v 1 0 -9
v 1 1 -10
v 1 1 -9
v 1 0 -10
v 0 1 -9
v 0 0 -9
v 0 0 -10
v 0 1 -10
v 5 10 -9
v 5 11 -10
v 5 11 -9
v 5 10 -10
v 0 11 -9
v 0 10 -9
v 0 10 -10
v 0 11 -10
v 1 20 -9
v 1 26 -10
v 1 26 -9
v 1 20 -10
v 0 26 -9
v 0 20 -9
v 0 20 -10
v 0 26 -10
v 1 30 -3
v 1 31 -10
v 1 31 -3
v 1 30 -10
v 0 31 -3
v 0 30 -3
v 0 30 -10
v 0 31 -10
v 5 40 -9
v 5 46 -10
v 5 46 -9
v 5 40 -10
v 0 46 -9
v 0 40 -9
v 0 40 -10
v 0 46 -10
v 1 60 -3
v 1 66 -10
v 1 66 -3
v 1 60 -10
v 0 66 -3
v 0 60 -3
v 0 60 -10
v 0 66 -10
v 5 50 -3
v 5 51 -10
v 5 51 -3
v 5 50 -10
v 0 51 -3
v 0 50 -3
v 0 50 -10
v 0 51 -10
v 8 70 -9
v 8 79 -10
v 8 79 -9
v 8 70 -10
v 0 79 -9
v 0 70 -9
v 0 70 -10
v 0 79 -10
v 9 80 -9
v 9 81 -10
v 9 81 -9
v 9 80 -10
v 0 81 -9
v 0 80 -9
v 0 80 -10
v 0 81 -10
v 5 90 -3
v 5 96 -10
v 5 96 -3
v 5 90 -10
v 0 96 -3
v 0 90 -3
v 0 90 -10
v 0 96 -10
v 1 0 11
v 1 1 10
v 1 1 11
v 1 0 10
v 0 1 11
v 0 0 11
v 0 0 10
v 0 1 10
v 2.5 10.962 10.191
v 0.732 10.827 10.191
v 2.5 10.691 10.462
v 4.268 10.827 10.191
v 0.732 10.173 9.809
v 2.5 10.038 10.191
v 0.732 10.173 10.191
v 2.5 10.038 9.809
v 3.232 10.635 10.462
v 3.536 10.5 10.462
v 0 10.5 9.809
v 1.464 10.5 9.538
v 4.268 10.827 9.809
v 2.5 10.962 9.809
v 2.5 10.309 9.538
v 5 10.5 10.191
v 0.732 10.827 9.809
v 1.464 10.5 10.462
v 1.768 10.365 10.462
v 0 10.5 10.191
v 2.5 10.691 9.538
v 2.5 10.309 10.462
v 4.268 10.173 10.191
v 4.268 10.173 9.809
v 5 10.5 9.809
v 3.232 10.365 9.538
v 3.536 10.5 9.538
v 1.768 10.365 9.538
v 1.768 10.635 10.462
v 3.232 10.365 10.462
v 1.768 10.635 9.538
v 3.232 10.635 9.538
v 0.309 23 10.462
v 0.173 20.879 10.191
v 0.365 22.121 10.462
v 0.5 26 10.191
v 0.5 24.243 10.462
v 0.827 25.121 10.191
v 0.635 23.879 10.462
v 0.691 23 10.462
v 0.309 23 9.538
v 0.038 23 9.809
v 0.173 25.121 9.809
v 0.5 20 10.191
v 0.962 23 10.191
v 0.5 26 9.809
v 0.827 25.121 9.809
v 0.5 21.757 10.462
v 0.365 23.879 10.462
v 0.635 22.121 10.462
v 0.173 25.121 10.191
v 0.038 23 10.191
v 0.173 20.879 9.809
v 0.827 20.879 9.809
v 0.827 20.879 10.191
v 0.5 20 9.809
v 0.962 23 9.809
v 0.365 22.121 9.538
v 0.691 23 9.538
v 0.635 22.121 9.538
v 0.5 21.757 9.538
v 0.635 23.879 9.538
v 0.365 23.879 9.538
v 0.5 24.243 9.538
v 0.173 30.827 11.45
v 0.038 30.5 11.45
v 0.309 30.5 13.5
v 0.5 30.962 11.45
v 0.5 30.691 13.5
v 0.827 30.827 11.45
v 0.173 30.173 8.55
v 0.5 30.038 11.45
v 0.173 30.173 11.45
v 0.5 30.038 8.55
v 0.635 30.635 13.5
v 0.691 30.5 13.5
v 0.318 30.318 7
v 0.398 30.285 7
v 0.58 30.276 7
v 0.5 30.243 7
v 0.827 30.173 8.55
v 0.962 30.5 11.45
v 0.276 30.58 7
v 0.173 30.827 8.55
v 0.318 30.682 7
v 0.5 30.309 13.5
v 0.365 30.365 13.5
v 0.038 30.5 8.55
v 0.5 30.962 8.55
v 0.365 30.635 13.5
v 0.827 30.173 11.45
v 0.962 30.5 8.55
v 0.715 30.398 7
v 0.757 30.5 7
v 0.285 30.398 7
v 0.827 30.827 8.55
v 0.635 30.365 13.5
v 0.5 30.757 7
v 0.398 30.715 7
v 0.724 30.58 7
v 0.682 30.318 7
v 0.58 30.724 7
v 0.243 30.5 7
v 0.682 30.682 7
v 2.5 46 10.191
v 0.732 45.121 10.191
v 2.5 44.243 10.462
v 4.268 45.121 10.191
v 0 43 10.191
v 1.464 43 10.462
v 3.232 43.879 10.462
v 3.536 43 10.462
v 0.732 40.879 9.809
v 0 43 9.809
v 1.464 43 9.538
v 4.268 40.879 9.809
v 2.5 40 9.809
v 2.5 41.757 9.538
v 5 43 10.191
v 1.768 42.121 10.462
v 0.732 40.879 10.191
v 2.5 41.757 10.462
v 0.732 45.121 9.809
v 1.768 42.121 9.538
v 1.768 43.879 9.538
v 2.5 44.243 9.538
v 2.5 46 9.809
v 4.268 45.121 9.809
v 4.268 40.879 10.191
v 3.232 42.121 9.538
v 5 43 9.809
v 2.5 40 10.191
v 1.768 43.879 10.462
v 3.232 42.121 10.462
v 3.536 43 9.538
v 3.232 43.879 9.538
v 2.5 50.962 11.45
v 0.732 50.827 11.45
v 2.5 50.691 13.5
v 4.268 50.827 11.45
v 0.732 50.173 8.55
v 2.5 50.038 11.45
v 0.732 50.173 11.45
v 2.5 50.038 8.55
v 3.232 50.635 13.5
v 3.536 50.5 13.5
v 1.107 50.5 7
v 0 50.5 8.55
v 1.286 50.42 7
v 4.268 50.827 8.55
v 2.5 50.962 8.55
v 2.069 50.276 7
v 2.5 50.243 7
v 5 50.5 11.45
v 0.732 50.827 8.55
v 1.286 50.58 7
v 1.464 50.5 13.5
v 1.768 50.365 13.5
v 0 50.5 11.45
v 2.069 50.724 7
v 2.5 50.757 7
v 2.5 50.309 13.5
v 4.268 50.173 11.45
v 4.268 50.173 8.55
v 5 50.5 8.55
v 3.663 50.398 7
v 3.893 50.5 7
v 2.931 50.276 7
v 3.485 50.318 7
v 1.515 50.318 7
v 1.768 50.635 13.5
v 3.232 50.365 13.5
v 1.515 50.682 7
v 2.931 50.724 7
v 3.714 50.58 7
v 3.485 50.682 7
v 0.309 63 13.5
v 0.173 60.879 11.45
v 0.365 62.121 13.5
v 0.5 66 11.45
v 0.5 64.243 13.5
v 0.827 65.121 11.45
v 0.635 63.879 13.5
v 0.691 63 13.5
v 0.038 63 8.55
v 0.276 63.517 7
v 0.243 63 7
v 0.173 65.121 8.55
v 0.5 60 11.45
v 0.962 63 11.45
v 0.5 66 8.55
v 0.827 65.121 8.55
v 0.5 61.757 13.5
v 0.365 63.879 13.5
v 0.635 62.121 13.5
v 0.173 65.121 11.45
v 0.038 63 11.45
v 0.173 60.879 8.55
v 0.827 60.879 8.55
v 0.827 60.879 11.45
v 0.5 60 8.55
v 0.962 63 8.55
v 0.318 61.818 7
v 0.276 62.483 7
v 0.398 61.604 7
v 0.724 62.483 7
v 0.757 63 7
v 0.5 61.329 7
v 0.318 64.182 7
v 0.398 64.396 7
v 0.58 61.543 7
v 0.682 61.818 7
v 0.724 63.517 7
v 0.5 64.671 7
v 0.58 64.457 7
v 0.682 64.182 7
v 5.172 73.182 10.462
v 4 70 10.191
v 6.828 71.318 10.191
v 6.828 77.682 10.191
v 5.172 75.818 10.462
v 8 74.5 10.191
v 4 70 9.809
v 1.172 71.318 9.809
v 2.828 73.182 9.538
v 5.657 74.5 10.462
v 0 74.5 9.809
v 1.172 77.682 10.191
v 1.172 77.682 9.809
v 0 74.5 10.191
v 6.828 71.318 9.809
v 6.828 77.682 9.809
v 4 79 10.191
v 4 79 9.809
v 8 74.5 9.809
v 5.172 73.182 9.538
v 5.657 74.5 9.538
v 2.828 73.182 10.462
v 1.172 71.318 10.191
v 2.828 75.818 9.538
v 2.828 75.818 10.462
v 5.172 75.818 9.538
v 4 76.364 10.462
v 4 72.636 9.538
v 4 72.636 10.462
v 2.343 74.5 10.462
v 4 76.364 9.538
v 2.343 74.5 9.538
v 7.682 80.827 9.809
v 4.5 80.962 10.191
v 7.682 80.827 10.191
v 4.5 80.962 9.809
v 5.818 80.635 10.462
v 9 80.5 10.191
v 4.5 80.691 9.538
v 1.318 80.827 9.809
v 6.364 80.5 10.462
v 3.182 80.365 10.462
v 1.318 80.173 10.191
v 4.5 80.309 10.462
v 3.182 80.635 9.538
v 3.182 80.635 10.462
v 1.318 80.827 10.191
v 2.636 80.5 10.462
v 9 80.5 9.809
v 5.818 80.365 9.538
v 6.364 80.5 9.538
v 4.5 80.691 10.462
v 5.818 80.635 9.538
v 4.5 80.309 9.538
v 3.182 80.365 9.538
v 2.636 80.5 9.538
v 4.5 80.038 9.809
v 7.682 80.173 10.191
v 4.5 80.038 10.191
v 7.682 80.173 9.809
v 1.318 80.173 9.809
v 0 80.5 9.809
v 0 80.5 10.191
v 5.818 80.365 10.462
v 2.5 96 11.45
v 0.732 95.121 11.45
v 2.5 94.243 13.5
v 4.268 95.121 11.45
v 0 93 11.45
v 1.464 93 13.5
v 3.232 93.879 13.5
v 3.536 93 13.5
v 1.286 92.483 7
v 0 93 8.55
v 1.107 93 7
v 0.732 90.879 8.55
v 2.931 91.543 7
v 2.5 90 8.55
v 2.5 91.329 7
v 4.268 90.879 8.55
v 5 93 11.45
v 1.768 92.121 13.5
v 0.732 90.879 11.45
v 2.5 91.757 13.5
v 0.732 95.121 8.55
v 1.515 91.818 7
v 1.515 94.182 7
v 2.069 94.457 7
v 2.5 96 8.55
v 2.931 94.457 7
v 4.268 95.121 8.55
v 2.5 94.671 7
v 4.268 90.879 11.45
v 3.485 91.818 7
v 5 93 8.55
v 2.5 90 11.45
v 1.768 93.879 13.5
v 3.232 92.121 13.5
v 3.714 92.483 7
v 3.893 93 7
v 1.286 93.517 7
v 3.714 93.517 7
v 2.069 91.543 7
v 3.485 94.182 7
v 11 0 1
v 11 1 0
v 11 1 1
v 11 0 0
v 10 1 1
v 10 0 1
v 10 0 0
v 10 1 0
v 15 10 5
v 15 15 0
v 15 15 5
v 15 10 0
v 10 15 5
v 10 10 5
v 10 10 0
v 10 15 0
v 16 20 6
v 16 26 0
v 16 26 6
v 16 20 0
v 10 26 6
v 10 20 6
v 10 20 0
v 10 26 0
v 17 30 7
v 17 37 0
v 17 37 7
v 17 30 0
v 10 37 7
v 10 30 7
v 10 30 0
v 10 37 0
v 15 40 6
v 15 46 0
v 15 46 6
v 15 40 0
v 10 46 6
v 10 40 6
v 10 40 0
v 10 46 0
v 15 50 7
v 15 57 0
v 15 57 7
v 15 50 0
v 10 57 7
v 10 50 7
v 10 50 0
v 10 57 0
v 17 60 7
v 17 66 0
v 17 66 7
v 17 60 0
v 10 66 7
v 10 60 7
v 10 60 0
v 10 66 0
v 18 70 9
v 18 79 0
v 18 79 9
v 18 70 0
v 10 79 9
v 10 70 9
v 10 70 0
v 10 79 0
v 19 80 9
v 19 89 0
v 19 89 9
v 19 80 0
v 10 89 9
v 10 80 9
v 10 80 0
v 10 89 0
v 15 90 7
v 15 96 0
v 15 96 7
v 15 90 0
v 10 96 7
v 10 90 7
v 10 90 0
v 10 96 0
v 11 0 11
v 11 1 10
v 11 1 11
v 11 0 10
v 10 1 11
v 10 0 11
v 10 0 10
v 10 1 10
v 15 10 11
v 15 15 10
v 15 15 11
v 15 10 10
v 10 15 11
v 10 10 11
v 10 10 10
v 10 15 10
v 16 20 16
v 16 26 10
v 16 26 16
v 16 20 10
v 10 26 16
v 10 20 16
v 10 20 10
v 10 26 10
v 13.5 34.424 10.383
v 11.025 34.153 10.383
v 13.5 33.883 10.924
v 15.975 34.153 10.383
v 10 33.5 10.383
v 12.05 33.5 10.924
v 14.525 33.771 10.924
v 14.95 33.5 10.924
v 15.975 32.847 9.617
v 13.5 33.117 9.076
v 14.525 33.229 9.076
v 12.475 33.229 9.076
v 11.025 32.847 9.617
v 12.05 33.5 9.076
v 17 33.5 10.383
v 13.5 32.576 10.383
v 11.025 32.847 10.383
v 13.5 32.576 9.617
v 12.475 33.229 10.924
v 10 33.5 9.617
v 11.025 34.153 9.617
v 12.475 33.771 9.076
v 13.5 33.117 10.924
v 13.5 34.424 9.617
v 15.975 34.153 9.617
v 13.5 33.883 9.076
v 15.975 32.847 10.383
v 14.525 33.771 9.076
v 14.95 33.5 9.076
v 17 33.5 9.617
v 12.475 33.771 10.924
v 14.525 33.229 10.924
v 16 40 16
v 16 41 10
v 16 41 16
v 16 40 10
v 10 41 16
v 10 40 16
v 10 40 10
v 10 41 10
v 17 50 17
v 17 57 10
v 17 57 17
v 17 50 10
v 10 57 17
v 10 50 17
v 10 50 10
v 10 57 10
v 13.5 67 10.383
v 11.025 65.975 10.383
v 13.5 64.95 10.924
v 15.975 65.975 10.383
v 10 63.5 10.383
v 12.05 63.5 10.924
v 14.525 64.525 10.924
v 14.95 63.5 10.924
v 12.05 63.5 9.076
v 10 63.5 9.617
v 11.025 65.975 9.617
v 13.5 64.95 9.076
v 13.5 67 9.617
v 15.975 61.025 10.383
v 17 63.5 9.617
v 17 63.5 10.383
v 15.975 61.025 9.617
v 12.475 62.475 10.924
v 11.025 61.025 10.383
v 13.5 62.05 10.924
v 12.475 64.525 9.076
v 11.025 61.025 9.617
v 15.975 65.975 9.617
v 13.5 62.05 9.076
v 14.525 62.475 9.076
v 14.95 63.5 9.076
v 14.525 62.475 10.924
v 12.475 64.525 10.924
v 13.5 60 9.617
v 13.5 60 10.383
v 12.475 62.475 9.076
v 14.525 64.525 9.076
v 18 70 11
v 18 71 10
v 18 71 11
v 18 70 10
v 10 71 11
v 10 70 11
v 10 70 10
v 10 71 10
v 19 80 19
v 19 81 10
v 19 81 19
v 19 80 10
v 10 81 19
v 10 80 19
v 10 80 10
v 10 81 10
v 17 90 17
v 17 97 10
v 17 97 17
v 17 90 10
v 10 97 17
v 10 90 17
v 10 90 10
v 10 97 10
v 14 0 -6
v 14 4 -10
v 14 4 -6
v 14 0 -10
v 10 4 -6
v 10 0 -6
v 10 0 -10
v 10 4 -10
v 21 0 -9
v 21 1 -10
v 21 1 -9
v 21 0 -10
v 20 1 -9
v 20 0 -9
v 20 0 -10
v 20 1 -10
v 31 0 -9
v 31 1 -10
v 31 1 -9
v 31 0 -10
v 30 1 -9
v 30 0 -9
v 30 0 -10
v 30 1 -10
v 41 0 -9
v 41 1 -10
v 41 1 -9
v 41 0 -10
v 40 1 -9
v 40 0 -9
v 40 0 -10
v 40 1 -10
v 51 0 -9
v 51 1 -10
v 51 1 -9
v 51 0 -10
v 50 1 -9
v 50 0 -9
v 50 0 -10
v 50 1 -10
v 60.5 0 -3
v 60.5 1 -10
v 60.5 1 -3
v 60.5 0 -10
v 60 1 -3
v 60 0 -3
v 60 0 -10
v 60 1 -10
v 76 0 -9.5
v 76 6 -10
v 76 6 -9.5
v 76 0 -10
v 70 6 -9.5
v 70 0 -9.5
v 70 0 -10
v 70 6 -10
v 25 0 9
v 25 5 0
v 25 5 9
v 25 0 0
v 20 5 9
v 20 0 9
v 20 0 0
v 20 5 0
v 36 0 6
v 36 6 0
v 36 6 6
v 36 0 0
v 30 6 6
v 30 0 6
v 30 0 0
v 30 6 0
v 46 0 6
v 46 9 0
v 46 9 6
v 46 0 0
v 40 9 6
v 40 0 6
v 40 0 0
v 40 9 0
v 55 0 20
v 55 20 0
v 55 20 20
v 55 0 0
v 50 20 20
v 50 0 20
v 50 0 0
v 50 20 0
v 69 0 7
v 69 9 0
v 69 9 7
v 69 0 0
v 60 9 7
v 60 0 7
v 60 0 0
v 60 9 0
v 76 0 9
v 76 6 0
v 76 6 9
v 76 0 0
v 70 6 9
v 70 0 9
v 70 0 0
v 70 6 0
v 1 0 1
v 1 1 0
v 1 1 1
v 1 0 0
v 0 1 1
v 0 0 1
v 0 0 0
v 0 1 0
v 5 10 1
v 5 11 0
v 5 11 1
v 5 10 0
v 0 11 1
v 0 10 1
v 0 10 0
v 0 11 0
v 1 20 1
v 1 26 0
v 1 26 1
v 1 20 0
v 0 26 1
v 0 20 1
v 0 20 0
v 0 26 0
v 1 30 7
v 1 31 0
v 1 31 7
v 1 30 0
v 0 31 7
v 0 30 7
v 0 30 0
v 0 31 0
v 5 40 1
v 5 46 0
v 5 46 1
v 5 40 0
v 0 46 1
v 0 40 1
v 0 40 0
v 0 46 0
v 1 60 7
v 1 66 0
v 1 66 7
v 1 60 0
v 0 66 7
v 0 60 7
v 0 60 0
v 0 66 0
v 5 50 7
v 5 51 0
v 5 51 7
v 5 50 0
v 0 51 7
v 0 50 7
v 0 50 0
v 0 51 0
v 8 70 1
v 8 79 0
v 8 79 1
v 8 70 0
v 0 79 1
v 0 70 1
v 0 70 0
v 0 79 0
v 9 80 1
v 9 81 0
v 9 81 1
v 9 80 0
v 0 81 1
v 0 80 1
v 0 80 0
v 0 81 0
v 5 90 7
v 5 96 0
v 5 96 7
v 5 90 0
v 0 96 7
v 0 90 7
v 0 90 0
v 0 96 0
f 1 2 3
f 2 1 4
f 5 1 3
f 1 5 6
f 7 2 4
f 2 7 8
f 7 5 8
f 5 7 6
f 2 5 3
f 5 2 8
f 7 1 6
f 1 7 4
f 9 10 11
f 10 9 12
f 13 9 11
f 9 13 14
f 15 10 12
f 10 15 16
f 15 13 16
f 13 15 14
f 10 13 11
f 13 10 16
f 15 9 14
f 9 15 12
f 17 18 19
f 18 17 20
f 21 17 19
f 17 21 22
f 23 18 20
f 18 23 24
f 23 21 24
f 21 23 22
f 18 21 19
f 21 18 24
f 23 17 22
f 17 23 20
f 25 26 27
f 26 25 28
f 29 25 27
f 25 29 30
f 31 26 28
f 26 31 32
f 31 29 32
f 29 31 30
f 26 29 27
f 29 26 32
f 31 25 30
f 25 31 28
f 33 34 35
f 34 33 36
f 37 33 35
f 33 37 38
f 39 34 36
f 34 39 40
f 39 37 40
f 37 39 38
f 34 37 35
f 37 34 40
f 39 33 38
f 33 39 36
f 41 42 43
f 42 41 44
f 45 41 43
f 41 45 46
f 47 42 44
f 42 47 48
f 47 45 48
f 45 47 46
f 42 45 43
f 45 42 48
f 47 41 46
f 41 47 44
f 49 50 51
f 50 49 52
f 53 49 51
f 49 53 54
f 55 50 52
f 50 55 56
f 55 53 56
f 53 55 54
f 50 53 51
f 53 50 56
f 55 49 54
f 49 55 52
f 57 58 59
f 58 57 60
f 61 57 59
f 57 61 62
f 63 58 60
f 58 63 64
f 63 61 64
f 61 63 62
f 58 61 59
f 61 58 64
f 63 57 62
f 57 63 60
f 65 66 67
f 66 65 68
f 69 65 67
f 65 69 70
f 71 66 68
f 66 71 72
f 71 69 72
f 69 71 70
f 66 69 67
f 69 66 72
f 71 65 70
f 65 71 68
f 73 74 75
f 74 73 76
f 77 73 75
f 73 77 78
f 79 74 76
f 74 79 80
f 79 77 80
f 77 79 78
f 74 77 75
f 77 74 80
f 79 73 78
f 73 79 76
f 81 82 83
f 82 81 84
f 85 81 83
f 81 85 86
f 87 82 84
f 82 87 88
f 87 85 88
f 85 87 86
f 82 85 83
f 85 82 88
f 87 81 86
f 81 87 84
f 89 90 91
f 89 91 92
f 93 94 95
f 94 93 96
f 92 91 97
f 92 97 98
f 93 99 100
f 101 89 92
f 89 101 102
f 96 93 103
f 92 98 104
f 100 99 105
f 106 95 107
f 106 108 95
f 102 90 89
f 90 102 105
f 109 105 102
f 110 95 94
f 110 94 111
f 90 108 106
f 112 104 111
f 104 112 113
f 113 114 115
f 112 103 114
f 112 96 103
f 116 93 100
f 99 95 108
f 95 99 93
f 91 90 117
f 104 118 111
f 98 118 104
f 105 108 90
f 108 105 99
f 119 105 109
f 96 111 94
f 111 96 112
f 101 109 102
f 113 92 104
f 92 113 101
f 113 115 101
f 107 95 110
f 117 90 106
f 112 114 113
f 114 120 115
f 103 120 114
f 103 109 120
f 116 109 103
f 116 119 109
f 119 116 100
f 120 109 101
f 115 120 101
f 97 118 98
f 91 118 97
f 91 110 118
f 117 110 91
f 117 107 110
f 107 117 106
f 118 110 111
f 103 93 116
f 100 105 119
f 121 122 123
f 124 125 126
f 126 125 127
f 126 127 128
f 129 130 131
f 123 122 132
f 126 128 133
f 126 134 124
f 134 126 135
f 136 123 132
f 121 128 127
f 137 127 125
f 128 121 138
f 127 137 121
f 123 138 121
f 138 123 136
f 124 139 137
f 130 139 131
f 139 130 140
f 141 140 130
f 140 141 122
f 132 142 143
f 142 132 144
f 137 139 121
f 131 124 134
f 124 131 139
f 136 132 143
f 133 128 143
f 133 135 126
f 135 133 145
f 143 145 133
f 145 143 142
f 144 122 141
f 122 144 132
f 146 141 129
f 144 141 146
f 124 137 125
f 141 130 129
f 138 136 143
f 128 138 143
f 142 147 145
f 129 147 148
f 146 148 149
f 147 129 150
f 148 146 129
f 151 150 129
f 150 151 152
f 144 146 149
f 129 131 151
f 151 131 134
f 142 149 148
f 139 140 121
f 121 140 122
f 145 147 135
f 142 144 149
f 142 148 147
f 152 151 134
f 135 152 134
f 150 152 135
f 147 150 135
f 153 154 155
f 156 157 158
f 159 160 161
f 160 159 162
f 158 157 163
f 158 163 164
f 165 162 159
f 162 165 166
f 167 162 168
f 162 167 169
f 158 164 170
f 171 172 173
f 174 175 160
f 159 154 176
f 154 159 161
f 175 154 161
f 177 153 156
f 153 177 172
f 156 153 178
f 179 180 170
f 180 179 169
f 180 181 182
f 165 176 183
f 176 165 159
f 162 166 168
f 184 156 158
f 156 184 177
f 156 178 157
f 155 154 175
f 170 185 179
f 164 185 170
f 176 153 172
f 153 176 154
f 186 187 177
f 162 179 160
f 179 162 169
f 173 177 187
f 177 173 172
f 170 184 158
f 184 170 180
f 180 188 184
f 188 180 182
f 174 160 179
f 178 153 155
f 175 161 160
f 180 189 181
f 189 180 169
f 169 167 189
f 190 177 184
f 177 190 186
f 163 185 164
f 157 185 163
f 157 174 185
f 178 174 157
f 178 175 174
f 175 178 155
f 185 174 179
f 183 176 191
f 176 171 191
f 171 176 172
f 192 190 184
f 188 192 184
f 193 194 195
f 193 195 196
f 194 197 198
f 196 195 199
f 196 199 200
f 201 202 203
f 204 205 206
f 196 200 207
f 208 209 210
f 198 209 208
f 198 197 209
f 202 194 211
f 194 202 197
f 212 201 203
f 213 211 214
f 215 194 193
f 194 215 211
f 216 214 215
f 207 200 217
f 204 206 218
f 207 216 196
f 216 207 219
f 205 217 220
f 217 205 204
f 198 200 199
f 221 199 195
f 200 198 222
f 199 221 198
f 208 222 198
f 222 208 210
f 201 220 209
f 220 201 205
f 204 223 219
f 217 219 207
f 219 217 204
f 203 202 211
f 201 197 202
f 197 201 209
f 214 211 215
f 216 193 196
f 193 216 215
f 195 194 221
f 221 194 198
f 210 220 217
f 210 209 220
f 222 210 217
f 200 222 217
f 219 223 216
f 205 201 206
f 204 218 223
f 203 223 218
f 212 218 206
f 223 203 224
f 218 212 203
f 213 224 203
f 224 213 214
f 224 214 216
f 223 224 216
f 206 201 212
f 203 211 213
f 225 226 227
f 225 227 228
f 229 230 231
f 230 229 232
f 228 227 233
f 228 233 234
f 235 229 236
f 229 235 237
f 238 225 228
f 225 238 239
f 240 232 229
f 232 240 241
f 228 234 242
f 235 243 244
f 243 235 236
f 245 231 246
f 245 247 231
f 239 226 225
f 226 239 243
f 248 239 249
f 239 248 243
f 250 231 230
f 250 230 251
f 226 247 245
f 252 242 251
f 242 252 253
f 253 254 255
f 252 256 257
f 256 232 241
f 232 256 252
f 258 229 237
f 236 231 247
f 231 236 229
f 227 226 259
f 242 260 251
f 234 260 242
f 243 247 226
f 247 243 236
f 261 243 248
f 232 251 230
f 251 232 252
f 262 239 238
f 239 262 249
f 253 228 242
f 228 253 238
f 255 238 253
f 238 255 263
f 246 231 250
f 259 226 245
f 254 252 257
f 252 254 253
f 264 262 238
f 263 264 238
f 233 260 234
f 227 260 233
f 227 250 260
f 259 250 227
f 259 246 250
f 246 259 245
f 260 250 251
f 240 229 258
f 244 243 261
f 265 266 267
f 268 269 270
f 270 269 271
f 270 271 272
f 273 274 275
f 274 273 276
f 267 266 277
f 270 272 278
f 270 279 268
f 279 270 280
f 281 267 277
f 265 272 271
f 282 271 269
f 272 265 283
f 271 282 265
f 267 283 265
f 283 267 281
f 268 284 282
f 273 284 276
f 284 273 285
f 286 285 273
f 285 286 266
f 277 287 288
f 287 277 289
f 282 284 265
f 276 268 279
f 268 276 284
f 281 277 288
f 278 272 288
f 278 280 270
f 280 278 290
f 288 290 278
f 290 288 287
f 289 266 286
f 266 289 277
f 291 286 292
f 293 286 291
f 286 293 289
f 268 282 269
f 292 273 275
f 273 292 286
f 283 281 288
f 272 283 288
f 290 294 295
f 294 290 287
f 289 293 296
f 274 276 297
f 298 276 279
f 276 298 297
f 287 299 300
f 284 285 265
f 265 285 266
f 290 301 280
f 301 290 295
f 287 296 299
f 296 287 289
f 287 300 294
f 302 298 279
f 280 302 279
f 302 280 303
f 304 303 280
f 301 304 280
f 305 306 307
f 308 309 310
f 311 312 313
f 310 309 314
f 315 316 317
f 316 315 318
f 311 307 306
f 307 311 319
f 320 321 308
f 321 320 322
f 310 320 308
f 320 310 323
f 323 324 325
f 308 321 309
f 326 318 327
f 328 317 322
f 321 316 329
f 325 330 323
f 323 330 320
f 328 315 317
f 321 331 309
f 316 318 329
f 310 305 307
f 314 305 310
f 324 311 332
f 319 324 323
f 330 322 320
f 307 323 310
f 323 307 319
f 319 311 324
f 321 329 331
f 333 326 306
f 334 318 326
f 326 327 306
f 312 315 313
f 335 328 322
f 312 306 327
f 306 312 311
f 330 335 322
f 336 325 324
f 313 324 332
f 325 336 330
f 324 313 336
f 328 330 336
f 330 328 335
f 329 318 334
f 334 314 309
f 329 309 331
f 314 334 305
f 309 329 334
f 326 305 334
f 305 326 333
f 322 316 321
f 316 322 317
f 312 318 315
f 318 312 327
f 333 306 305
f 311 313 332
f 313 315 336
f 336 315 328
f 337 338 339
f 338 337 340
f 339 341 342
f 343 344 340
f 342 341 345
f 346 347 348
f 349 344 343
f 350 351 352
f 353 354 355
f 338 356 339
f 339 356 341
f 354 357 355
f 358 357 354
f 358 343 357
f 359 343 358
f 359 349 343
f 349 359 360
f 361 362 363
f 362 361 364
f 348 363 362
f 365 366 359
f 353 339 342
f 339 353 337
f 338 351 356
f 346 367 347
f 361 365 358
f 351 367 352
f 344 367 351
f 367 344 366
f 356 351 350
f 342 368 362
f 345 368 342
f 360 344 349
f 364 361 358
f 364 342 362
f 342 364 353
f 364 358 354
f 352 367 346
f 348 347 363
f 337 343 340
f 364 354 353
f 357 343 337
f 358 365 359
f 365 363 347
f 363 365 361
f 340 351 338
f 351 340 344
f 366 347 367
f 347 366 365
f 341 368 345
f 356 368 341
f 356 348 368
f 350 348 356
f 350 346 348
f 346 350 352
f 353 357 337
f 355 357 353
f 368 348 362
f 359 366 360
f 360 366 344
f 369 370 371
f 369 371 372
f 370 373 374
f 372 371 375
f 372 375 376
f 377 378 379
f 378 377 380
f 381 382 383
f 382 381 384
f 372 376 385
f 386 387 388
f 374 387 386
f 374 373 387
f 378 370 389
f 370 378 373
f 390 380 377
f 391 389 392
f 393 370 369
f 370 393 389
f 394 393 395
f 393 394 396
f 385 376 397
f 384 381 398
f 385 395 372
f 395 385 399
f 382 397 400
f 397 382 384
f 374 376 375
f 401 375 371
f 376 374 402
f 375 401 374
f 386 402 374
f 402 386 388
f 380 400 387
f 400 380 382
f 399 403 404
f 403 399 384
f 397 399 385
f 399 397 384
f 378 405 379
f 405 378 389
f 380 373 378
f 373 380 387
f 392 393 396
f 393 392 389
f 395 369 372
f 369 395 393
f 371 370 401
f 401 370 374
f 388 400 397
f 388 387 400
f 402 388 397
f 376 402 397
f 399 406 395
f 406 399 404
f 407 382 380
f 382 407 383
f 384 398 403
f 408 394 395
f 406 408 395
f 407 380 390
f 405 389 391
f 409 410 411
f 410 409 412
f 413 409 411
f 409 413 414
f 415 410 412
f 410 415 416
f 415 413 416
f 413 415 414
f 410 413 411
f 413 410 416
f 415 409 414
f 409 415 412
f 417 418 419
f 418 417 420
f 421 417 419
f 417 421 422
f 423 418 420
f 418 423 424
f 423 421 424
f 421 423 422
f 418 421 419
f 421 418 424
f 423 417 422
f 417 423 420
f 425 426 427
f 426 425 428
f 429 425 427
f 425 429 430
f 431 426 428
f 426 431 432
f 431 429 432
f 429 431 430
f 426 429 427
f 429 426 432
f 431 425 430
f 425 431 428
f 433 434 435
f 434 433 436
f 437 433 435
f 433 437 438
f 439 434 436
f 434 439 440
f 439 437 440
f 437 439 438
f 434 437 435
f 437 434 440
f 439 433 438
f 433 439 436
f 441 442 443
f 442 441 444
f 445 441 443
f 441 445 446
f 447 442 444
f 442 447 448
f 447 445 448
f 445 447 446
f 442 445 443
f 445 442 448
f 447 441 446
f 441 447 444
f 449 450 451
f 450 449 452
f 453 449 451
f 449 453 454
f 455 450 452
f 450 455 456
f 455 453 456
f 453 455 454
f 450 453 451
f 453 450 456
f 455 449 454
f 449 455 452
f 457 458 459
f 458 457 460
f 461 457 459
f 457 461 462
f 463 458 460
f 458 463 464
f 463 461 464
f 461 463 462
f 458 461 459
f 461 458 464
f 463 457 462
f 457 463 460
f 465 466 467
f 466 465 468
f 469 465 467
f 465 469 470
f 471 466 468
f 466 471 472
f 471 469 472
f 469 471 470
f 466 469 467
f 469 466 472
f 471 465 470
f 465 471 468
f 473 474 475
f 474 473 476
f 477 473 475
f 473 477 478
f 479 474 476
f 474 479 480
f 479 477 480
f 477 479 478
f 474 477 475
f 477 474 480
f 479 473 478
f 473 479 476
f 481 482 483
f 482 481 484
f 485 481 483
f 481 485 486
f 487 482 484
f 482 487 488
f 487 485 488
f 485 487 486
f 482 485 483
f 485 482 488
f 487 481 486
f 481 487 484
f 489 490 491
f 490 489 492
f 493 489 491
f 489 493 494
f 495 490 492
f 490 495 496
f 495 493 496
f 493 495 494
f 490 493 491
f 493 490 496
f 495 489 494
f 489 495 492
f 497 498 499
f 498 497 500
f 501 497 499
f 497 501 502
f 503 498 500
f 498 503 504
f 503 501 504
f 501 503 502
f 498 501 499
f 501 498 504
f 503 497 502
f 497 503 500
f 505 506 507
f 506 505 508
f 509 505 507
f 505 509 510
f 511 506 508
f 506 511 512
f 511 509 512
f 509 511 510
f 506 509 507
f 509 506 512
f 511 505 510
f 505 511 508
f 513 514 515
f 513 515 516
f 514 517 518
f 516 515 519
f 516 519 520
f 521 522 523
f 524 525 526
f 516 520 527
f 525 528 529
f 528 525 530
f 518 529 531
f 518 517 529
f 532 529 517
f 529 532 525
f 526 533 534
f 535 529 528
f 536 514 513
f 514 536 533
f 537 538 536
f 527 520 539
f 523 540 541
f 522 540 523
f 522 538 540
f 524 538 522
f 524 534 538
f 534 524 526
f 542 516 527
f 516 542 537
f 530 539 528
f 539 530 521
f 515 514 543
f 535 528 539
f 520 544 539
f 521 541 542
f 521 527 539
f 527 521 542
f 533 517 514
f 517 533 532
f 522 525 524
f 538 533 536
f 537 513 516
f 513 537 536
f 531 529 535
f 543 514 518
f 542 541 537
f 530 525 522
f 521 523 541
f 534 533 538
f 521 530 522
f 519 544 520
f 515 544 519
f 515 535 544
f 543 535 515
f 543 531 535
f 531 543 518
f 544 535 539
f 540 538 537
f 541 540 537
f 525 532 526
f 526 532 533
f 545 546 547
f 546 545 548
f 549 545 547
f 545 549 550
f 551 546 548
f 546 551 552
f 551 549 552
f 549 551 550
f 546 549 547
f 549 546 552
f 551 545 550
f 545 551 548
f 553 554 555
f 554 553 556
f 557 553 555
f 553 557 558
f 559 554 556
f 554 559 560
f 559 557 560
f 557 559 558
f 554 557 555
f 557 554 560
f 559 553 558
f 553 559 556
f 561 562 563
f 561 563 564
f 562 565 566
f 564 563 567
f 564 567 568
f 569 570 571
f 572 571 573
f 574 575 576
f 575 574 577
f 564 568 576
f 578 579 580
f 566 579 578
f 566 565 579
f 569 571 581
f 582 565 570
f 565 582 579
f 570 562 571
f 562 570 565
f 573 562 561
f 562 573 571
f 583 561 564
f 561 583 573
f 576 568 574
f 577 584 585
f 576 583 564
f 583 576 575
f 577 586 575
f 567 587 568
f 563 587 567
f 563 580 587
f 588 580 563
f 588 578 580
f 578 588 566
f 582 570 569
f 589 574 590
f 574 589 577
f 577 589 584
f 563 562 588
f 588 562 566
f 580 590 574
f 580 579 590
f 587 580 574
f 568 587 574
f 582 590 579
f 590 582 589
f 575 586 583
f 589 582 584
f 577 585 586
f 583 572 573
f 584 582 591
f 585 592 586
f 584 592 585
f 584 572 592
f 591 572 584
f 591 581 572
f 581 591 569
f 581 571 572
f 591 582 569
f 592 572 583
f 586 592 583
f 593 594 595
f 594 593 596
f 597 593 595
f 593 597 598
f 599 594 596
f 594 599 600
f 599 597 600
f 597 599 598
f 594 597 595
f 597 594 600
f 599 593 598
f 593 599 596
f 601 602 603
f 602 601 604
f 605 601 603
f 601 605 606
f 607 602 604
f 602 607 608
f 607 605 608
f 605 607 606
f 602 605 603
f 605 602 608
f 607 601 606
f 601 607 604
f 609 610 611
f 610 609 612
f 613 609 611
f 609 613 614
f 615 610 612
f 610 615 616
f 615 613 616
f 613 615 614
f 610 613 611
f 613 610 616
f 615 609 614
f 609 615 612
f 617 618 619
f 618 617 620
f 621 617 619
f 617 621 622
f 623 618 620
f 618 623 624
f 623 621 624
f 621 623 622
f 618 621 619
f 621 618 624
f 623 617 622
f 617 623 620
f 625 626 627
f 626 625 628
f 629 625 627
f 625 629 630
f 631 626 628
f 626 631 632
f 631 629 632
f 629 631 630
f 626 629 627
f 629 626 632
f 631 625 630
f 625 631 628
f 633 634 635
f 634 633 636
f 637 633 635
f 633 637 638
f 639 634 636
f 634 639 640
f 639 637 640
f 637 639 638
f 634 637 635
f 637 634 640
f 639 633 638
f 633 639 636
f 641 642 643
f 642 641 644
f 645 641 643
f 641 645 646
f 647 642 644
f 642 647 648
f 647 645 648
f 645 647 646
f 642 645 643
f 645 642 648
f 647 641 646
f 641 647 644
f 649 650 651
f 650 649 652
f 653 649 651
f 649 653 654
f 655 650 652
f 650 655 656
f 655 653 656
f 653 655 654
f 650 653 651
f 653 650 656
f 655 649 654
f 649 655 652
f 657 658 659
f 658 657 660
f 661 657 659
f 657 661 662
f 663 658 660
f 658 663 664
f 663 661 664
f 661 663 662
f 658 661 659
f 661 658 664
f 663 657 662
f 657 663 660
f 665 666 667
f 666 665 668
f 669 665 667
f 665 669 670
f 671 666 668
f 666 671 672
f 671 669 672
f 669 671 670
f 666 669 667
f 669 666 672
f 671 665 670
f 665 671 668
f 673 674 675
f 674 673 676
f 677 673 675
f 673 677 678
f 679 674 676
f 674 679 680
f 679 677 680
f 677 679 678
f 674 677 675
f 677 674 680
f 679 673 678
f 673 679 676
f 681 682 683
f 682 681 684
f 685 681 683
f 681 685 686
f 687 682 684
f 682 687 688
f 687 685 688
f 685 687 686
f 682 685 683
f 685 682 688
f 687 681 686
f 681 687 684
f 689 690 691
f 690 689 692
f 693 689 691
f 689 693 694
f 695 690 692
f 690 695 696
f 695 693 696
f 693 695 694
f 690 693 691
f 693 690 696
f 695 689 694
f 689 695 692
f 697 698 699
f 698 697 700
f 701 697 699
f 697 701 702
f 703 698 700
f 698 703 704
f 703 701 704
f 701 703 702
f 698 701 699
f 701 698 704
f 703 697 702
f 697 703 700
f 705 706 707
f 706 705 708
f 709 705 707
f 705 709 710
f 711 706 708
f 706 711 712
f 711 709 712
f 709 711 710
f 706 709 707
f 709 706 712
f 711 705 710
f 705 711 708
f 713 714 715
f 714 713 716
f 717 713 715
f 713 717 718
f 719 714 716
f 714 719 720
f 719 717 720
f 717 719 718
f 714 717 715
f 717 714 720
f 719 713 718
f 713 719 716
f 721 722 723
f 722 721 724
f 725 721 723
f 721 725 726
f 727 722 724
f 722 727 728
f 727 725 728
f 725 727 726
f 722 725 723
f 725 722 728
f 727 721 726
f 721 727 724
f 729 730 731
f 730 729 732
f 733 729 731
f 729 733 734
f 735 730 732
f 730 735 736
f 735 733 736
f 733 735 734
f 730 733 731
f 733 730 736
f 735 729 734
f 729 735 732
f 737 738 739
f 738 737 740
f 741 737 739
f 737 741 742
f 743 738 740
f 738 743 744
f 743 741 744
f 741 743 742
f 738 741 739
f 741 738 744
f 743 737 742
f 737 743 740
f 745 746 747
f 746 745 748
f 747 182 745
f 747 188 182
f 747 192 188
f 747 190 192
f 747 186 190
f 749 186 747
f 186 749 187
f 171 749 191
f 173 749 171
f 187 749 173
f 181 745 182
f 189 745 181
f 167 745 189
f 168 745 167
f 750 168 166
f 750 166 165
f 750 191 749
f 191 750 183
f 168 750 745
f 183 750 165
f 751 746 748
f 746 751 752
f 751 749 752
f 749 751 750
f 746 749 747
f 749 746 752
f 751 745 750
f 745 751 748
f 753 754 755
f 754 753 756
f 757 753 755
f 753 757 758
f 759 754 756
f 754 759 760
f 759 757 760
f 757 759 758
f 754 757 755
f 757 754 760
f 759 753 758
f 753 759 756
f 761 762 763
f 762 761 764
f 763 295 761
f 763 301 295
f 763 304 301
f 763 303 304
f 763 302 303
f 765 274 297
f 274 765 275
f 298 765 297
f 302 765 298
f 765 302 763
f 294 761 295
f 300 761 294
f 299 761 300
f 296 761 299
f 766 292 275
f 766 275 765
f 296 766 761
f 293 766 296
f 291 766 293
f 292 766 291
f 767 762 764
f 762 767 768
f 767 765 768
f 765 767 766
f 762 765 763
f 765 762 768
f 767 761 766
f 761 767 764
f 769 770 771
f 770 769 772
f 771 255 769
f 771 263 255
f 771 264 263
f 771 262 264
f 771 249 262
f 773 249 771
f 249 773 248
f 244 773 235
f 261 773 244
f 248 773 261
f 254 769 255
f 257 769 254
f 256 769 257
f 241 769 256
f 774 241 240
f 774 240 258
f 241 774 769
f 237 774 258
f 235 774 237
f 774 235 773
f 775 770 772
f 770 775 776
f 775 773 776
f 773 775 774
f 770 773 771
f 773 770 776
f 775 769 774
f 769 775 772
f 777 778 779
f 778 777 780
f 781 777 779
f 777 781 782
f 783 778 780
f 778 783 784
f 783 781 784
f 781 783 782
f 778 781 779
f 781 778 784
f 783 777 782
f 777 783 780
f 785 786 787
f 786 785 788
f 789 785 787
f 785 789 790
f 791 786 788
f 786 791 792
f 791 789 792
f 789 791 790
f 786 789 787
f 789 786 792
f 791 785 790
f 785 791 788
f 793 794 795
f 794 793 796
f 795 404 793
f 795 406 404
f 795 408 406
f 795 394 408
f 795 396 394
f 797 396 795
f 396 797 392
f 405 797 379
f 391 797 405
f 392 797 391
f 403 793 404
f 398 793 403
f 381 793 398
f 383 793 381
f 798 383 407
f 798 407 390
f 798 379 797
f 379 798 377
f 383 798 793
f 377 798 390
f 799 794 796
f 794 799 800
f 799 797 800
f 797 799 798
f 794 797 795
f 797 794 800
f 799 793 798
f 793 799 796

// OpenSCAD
// bottom row (red) = reference
// middle row (gold) = should match reference
// top row (blue) = should be 'spherical' versions of gold row,
//     and should be inscribed in gold row in 'top' view
// back row (green) = should be all cubes auto-scaled up
// back top (purple) = uses 'auto' feature
// lime green = 'auto' feature where we 'shrink'
// pink = recursive resize, negative, <1, wrong syntax, etc

$fn=8;

color("red") {
translate([0, 0,-10]) cube();
translate([0,10,-10]) cube([5,1,1]);
translate([0,20,-10]) cube([1,6,1]);
translate([0,30,-10]) cube([1,1,7]);
translate([0,40,-10]) cube([5,6,1]);
translate([0,60,-10]) cube([1,6,7]);
translate([0,50,-10]) cube([5,1,7]);
translate([0,70,-10]) cube([8,9,1]);
translate([0,80,-10]) cube([9,1,1]);
translate([0,90,-10]) cube([5,6,7]);
}

translate([0, 0,0]) cube();
translate([0,10,0]) resize([5,0,0]) cube();
translate([0,20,0]) resize([0,6,0]) cube();
translate([0,30,0]) resize([0,0,7]) cube();
translate([0,40,0]) resize([5,6,0]) cube();
translate([0,60,0]) resize([0,6,7]) cube();
translate([0,50,0]) resize([5,0,7]) cube();
translate([0,70,0]) resize([8,9]) cube();
translate([0,80,0]) resize([9]) cube();
translate([0,90,0]) resize([5,6,7]) cube();

color("blue"){
translate([0, 0,10]) cube();
translate([2.5,10.5,10]) resize([5,0,0]) sphere(0.5);
translate([0.5,23,10]) resize([0,6,0]) sphere(0.5);
translate([0.5,30.5,10]) resize([0,0,7]) sphere(0.5);
translate([2.5,43,10]) resize([5,6,0]) sphere(0.5);
translate([2.5,50.5,10]) resize([5,0,7]) sphere(0.5);
translate([0.5,63,10]) resize([0,6,7]) sphere(0.5);
translate([4,74.5,10]) resize([8,9]) sphere(0.5);
translate([4.5,80.5,10]) resize([9]) sphere(0.5);
translate([2.5,93,10]) resize([5,6,7]) sphere(0.5);
}

color("green"){
translate([10, 0, 0]) cube();
translate([10,10,0]) resize([5,0,0],auto=true) cube();
translate([10,20,0]) resize([0,6,0],auto=true) cube();
translate([10,30,0]) resize([0,0,7],auto=true) cube();
translate([10,40,0]) resize([5,6,0],true) cube();
translate([10,50,0]) resize([5,0,7],true) cube();
translate([10,60,0]) resize([0,6,7],auto=true) cube();
translate([10,70,0]) resize([8,9],auto=true) cube();
translate([10,80,0]) resize([9],true) cube();
translate([10,90,0]) resize([5,6,7],auto=true) cube();
}

color("purple"){
translate([10, 0, 10]) cube();
translate([10,10,10]) resize([5,0,0],auto=[true,true,false]) cube();
translate([10,20,10]) resize([6,0,0],auto=[true,true,true]) cube();
translate([13.5,33.5,10]) resize([7,0,0],auto=[true,false,false]) sphere();
translate([10,40,10]) resize([6,0,0],auto=[true,false,true]) cube();
translate([10,50,10]) resize([7,0,7],auto=[false,true,true]) cube();
translate([13.5,63.5,10]) resize([7,0,0],auto=[false,true,false]) sphere();
translate([10,70,10]) resize([8,0,0],auto=[false,false,false]) cube();
translate([10,80,10]) resize([9,0,0],auto=[false,false,true]) cube();
translate([10,90,10]) resize([0,0,7],auto=[true,true,false]) cube();
}

color("pink"){
translate([10 , 0,-10]) resize([4,4,4]) resize([5000,100,1000]) cube();
translate([20,0,-10]) resize([-5,0,0]) cube();
translate([30,0,-10]) resize([-5,0,0],auto=3) cube();
translate([40,0,-10]) resize(-5,0,0,auto=3) cube();
translate([50,0,-10]) resize(5,0,0) cube();
translate([60,0,-10]) resize([0.5,0,7]) cube([0.5,1,1000]);
translate([70,0,-10]) resize([0,0,0.5]) cube([6,6,10000000000]);
}

color("lime"){
translate([20,0,0]) resize([5,0,0],auto=[true,true,false]) cube(9);
translate([30,0,0]) resize([6,0,0],auto=[true,true,true]) cube(9);
translate([40,0,0]) resize([6,0,0],auto=[true,false,true]) cube(9);
translate([50,0,0]) resize([5,0,20],auto=[false,true,true]) cube(9);
translate([60,0,0]) resize([0,0,7],auto=[false,false,true]) cube(9);
translate([70,0,0]) resize([6,0,0],auto=[true,true,false]) cube(9);
}
